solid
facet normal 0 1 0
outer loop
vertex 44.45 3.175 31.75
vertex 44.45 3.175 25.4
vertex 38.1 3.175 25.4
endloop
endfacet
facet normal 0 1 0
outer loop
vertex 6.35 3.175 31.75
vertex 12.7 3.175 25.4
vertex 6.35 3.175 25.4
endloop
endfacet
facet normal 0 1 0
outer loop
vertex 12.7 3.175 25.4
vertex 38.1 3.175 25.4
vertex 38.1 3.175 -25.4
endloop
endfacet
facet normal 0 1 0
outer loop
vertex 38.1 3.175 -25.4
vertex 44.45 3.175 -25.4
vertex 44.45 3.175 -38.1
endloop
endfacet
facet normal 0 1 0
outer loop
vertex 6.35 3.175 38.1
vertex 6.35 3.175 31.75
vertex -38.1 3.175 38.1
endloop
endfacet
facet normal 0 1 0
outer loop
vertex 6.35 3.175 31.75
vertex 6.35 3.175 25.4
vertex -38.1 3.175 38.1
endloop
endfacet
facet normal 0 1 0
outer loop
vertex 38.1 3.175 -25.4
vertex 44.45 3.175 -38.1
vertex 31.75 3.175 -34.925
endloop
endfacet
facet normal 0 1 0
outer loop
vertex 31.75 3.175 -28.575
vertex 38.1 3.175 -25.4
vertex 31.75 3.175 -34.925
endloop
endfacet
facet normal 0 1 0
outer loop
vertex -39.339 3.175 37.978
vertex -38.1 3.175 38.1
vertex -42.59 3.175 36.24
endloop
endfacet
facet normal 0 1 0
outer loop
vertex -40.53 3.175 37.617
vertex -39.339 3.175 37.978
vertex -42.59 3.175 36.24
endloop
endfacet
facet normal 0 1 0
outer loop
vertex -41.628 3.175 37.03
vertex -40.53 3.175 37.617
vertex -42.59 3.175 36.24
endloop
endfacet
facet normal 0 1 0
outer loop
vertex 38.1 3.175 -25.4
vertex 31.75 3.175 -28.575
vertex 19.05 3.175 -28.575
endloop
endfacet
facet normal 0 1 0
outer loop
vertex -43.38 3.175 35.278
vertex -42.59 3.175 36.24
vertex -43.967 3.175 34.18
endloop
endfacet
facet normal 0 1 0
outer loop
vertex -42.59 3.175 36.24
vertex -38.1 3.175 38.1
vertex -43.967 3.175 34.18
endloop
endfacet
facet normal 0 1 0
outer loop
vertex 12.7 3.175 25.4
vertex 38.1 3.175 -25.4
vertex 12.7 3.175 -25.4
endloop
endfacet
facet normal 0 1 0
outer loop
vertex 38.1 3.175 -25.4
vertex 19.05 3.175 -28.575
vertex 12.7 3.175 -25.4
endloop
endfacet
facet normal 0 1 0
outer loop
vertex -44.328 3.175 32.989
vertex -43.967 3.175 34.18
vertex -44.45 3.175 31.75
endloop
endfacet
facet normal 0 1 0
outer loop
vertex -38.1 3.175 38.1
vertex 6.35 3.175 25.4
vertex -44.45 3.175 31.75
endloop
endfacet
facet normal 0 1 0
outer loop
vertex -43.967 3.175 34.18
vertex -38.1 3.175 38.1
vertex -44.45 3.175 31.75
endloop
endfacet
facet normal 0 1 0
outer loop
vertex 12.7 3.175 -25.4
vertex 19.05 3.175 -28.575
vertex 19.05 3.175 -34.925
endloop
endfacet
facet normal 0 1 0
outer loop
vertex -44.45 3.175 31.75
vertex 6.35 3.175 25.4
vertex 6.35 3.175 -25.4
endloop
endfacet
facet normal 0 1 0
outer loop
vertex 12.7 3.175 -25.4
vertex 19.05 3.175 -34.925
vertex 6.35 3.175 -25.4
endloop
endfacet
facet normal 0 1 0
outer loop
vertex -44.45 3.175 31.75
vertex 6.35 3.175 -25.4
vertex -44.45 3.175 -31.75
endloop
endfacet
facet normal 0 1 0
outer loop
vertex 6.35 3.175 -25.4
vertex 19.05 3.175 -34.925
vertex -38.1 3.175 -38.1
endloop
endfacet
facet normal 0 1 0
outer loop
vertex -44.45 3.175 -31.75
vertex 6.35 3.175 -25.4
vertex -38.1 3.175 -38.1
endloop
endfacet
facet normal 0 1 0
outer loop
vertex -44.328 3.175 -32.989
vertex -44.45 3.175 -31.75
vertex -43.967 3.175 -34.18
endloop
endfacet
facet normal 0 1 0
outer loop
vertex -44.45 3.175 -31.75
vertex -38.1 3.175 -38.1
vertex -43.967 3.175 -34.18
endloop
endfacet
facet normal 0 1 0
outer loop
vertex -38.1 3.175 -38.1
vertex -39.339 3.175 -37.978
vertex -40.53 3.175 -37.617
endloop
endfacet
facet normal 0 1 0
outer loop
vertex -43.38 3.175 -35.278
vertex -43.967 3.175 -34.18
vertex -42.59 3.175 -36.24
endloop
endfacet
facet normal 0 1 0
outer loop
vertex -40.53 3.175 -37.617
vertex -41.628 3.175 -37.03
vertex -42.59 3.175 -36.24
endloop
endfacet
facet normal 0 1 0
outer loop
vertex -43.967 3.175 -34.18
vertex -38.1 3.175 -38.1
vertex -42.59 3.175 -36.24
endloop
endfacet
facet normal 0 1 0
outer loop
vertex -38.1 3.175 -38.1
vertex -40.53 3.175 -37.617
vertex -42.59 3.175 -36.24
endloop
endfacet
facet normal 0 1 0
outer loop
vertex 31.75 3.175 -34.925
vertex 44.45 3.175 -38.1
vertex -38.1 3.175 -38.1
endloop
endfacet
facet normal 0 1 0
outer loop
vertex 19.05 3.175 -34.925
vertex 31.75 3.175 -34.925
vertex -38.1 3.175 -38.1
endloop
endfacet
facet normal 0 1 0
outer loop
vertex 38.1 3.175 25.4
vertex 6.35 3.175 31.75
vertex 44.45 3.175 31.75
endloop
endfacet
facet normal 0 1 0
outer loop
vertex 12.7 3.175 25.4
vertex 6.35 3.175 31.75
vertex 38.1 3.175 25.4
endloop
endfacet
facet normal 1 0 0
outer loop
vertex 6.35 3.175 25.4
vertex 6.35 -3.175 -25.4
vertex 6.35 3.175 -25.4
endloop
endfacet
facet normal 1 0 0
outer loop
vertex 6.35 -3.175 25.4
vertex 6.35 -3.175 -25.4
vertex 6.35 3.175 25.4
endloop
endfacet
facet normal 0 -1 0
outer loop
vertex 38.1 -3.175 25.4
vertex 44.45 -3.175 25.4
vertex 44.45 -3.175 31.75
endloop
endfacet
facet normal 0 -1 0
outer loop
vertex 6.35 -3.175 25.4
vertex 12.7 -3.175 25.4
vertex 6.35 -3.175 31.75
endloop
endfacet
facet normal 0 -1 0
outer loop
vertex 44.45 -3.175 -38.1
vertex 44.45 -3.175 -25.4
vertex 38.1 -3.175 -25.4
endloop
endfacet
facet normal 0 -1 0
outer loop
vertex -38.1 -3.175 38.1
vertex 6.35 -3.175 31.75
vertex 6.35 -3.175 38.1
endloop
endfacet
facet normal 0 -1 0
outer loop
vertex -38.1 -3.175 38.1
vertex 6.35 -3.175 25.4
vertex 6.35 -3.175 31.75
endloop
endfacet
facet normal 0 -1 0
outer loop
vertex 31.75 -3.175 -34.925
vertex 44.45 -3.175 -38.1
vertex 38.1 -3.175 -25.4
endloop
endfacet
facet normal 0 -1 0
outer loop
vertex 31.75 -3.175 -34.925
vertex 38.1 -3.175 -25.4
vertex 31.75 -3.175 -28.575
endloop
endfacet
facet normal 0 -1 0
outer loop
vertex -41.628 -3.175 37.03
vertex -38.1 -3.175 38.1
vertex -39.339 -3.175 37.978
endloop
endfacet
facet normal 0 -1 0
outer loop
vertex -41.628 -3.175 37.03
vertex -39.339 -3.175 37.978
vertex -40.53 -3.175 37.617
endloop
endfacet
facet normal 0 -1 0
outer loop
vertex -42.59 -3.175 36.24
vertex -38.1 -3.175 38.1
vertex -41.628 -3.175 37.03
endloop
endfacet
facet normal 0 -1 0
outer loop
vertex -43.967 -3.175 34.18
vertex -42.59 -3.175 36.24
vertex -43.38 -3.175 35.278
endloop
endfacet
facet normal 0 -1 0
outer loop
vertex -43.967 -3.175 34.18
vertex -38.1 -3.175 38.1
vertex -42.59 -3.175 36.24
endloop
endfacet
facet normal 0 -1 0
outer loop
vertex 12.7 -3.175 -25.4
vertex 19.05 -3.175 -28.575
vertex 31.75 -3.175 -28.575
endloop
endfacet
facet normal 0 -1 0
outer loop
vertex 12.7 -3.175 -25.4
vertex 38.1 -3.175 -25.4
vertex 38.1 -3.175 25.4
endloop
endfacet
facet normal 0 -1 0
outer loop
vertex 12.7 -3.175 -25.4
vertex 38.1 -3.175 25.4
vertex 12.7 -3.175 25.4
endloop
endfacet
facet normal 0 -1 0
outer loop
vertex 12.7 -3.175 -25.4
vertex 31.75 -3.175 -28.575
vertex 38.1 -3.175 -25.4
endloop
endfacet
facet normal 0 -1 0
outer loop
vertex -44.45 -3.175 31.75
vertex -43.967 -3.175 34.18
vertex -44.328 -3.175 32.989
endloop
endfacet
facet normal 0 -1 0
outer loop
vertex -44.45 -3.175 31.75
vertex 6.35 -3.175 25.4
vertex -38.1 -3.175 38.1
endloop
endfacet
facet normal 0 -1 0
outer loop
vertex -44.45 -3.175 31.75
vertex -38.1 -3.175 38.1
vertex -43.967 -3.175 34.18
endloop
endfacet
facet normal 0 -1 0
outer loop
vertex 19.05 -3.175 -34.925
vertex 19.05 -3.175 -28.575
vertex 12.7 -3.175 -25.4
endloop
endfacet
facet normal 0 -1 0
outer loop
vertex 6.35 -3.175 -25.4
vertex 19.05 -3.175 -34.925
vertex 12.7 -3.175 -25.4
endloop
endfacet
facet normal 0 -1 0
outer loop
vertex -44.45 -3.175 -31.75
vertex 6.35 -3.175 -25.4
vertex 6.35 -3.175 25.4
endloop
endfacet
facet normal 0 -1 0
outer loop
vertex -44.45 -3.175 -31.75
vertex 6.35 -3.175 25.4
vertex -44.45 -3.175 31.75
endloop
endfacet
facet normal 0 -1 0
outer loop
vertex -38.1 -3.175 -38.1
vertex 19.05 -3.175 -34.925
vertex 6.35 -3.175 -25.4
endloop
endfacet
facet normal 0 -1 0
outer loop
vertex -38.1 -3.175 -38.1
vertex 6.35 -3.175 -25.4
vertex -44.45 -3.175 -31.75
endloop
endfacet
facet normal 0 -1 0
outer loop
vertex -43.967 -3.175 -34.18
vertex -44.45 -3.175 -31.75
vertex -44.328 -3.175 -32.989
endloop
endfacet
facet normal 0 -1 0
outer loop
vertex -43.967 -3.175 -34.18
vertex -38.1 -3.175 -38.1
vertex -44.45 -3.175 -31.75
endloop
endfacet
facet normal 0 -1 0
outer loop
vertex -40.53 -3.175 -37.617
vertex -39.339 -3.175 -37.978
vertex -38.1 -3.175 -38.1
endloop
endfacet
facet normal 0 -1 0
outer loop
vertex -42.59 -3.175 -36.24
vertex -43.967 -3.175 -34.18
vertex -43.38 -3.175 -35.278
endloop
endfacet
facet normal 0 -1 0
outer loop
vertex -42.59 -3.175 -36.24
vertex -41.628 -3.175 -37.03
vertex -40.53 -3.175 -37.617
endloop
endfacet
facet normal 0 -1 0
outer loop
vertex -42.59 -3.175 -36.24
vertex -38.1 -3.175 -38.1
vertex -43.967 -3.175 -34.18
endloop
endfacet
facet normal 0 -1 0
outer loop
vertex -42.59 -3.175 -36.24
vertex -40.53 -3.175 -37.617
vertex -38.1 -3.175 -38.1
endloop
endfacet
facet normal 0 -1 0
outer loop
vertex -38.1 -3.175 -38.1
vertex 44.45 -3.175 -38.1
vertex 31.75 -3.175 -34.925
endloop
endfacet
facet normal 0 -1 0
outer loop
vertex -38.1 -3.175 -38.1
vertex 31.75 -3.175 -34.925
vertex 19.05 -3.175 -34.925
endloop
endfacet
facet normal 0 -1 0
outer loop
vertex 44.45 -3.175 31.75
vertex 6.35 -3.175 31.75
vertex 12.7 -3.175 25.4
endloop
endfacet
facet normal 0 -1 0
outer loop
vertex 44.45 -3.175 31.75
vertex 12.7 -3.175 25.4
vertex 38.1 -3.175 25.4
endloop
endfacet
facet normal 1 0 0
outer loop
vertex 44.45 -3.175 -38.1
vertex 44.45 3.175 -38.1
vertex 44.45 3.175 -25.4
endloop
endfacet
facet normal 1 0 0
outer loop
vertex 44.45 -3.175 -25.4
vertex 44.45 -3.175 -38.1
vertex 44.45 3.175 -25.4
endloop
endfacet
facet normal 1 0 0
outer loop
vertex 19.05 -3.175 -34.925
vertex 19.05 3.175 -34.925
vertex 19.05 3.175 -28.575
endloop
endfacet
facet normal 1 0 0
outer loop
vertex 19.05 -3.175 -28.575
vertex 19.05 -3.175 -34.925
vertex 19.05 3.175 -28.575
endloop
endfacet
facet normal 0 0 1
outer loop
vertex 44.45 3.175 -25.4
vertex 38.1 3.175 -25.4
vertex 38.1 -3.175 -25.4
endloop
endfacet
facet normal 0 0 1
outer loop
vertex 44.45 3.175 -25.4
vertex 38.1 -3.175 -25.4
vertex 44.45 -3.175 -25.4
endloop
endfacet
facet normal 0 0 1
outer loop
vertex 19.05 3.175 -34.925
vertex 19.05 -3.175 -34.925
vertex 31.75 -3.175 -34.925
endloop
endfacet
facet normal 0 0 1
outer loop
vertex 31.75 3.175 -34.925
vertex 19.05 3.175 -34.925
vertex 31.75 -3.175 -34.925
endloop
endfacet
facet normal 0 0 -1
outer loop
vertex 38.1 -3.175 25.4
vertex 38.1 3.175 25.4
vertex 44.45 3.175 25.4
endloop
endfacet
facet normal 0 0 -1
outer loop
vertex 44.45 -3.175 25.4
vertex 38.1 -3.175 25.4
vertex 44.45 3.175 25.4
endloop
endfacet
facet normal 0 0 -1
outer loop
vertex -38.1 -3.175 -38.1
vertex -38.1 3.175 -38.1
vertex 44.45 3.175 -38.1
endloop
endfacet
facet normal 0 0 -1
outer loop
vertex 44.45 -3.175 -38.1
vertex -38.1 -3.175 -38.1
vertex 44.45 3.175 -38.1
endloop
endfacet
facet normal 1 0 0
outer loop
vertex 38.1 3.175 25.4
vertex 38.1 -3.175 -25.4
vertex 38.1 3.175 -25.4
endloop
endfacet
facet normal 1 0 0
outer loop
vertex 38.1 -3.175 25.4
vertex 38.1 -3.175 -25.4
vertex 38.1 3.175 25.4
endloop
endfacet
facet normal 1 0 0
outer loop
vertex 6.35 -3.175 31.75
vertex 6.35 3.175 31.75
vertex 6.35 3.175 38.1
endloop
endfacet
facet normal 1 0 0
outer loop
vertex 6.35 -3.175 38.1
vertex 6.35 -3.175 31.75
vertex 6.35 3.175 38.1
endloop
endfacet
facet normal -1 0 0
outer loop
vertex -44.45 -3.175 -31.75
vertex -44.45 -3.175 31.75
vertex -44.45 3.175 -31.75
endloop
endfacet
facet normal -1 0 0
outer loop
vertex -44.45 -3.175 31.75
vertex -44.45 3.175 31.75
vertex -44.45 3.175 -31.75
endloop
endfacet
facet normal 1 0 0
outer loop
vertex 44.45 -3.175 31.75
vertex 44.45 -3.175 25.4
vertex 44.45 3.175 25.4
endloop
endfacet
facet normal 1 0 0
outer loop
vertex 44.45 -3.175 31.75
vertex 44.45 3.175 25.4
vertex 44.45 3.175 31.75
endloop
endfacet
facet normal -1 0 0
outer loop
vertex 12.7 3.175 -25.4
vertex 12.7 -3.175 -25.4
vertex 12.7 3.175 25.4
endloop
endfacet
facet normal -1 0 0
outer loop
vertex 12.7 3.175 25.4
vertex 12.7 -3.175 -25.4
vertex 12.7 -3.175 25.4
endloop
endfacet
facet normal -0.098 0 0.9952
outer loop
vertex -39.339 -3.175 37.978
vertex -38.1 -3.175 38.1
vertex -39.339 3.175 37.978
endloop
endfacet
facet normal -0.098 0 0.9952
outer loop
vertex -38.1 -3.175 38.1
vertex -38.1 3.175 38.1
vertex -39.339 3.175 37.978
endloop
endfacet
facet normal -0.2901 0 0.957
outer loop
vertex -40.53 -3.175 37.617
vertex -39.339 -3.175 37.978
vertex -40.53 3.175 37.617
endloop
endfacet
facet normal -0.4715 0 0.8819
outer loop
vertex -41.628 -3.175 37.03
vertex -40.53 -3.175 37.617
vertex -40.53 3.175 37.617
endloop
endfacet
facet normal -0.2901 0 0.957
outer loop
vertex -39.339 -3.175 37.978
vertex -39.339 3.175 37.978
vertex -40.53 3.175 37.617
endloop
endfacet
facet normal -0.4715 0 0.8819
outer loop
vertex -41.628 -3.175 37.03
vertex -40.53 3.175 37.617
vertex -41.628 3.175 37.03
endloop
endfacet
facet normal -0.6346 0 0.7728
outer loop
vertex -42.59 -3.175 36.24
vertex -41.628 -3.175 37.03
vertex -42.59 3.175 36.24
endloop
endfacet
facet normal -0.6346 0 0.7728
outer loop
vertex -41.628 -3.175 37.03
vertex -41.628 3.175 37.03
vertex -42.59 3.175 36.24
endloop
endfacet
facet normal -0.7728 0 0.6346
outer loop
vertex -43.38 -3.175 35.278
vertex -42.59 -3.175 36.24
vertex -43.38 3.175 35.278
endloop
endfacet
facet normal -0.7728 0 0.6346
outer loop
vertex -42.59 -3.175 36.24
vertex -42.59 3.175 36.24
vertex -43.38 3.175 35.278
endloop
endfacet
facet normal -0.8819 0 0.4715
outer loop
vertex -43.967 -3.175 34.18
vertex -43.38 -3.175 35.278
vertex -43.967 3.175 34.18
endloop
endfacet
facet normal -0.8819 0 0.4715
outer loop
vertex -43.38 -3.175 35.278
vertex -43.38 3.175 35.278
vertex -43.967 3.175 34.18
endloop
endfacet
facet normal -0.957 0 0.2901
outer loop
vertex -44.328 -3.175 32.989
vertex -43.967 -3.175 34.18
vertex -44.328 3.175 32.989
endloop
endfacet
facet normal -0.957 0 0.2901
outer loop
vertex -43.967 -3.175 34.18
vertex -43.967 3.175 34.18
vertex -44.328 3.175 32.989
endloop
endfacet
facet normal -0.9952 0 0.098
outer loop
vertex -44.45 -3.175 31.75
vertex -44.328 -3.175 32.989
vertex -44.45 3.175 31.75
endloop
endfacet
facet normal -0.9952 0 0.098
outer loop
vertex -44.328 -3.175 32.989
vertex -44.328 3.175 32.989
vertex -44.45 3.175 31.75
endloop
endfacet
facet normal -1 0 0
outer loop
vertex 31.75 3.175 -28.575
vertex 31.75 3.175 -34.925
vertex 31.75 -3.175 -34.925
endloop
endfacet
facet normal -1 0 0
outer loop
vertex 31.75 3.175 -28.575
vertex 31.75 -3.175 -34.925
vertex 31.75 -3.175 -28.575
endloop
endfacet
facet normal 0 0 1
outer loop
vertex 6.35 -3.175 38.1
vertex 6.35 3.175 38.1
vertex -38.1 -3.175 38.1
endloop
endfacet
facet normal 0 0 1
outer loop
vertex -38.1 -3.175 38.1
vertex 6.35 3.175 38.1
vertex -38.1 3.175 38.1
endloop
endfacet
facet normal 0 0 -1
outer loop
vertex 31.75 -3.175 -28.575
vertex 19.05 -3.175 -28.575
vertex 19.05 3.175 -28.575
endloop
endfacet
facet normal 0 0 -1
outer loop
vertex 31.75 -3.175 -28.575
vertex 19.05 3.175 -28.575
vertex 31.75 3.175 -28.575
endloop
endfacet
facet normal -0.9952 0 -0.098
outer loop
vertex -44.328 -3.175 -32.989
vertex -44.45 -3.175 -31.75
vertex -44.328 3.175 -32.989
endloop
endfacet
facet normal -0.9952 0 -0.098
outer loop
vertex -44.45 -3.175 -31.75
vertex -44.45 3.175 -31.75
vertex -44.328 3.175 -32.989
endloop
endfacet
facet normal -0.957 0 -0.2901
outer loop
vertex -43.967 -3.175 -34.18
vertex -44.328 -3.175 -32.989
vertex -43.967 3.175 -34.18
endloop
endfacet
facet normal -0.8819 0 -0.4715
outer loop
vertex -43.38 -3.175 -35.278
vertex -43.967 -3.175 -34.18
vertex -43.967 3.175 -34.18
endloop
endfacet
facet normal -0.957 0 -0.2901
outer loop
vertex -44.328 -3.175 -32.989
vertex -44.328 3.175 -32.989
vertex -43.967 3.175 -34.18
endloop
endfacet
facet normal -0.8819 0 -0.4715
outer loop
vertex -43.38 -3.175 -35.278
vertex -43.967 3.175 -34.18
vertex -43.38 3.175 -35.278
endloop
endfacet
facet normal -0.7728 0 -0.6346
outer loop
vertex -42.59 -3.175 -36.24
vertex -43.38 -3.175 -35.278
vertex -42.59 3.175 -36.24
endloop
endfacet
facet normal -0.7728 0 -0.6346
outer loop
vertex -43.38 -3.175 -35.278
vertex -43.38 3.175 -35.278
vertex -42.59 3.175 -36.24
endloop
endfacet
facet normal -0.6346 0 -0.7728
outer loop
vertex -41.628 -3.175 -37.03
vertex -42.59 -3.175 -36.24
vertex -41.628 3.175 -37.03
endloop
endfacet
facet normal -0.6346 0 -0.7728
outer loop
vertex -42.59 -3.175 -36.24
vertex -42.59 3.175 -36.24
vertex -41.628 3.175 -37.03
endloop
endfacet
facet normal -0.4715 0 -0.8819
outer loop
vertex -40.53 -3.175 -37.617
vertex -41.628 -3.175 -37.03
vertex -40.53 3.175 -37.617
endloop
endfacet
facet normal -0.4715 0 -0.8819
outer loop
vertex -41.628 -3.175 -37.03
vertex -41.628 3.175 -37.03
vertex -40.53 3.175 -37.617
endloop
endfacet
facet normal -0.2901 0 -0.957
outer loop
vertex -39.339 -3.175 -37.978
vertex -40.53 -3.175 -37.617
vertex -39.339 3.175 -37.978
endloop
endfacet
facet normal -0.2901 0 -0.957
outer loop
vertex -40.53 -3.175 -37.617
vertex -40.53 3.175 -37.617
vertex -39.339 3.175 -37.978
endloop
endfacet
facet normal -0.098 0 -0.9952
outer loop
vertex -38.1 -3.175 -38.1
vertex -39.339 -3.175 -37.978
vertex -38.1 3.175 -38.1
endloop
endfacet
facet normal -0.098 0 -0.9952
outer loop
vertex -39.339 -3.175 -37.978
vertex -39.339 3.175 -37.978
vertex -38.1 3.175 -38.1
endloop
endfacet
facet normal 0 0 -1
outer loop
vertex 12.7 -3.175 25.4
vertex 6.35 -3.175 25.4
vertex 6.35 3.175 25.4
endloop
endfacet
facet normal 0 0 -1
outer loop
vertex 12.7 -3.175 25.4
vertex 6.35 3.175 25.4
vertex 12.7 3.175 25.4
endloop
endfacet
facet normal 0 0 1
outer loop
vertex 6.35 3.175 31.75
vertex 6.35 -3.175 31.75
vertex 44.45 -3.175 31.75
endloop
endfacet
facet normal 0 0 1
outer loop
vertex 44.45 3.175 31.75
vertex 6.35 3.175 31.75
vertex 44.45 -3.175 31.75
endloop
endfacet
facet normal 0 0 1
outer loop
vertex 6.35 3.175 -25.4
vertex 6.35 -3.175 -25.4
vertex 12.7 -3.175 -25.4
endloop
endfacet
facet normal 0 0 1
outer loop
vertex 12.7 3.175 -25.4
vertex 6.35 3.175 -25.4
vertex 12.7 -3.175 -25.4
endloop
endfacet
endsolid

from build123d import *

# Parameters (mm, degrees)
BOSS_EXTRUDE1_DEPTH = 3.175
SKETCH2_W           = 6.35
SKETCH2_H           = 50.8
SKETCH2_W_2         = 38.1
SKETCH2_H_2         = 6.35
SKETCH2_W_3         = 12.7
CUT_EXTRUDE1_DEPTH  = 59.887477446


with BuildPart() as part:
    # Sketch1 → Boss-Extrude1 (new, symmetric)
    with BuildSketch(Plane(origin=(0, 0, 0), x_dir=(1, 0, 0), z_dir=(0, 1, 0))):
        with BuildLine():
            Line((44.45, -38.1), (-38.1, -38.1))
            ThreePointArc((-38.1, -38.1), (-42.590128061, -36.240128061), (-44.45, -31.75))
            Line((-44.45, -31.75), (-44.45, 31.75))
            ThreePointArc((-44.45, 31.75), (-42.590128061, 36.240128061), (-38.1, 38.1))
            Line((-38.1, 38.1), (44.45, 38.1))
            Line((44.45, 38.1), (44.45, -38.1))
        make_face()
    extrude(amount=BOSS_EXTRUDE1_DEPTH, both=True)

    # Sketch2 → Cut-Extrude1 (cut, through all)
    with BuildSketch(Plane.XZ.offset(3.175)):
        with Locations((41.275, 0)):
            Rectangle(SKETCH2_W, SKETCH2_H)
        with Locations((25.4, 34.925)):
            Rectangle(SKETCH2_W_2, SKETCH2_H_2)
        with Locations((9.525, 0)):
            Rectangle(SKETCH2_W, SKETCH2_H)
        with Locations((25.4, -31.75)):
            Rectangle(SKETCH2_W_3, SKETCH2_H_2)
    extrude(amount=-CUT_EXTRUDE1_DEPTH, mode=Mode.SUBTRACT)


solid = part.part
